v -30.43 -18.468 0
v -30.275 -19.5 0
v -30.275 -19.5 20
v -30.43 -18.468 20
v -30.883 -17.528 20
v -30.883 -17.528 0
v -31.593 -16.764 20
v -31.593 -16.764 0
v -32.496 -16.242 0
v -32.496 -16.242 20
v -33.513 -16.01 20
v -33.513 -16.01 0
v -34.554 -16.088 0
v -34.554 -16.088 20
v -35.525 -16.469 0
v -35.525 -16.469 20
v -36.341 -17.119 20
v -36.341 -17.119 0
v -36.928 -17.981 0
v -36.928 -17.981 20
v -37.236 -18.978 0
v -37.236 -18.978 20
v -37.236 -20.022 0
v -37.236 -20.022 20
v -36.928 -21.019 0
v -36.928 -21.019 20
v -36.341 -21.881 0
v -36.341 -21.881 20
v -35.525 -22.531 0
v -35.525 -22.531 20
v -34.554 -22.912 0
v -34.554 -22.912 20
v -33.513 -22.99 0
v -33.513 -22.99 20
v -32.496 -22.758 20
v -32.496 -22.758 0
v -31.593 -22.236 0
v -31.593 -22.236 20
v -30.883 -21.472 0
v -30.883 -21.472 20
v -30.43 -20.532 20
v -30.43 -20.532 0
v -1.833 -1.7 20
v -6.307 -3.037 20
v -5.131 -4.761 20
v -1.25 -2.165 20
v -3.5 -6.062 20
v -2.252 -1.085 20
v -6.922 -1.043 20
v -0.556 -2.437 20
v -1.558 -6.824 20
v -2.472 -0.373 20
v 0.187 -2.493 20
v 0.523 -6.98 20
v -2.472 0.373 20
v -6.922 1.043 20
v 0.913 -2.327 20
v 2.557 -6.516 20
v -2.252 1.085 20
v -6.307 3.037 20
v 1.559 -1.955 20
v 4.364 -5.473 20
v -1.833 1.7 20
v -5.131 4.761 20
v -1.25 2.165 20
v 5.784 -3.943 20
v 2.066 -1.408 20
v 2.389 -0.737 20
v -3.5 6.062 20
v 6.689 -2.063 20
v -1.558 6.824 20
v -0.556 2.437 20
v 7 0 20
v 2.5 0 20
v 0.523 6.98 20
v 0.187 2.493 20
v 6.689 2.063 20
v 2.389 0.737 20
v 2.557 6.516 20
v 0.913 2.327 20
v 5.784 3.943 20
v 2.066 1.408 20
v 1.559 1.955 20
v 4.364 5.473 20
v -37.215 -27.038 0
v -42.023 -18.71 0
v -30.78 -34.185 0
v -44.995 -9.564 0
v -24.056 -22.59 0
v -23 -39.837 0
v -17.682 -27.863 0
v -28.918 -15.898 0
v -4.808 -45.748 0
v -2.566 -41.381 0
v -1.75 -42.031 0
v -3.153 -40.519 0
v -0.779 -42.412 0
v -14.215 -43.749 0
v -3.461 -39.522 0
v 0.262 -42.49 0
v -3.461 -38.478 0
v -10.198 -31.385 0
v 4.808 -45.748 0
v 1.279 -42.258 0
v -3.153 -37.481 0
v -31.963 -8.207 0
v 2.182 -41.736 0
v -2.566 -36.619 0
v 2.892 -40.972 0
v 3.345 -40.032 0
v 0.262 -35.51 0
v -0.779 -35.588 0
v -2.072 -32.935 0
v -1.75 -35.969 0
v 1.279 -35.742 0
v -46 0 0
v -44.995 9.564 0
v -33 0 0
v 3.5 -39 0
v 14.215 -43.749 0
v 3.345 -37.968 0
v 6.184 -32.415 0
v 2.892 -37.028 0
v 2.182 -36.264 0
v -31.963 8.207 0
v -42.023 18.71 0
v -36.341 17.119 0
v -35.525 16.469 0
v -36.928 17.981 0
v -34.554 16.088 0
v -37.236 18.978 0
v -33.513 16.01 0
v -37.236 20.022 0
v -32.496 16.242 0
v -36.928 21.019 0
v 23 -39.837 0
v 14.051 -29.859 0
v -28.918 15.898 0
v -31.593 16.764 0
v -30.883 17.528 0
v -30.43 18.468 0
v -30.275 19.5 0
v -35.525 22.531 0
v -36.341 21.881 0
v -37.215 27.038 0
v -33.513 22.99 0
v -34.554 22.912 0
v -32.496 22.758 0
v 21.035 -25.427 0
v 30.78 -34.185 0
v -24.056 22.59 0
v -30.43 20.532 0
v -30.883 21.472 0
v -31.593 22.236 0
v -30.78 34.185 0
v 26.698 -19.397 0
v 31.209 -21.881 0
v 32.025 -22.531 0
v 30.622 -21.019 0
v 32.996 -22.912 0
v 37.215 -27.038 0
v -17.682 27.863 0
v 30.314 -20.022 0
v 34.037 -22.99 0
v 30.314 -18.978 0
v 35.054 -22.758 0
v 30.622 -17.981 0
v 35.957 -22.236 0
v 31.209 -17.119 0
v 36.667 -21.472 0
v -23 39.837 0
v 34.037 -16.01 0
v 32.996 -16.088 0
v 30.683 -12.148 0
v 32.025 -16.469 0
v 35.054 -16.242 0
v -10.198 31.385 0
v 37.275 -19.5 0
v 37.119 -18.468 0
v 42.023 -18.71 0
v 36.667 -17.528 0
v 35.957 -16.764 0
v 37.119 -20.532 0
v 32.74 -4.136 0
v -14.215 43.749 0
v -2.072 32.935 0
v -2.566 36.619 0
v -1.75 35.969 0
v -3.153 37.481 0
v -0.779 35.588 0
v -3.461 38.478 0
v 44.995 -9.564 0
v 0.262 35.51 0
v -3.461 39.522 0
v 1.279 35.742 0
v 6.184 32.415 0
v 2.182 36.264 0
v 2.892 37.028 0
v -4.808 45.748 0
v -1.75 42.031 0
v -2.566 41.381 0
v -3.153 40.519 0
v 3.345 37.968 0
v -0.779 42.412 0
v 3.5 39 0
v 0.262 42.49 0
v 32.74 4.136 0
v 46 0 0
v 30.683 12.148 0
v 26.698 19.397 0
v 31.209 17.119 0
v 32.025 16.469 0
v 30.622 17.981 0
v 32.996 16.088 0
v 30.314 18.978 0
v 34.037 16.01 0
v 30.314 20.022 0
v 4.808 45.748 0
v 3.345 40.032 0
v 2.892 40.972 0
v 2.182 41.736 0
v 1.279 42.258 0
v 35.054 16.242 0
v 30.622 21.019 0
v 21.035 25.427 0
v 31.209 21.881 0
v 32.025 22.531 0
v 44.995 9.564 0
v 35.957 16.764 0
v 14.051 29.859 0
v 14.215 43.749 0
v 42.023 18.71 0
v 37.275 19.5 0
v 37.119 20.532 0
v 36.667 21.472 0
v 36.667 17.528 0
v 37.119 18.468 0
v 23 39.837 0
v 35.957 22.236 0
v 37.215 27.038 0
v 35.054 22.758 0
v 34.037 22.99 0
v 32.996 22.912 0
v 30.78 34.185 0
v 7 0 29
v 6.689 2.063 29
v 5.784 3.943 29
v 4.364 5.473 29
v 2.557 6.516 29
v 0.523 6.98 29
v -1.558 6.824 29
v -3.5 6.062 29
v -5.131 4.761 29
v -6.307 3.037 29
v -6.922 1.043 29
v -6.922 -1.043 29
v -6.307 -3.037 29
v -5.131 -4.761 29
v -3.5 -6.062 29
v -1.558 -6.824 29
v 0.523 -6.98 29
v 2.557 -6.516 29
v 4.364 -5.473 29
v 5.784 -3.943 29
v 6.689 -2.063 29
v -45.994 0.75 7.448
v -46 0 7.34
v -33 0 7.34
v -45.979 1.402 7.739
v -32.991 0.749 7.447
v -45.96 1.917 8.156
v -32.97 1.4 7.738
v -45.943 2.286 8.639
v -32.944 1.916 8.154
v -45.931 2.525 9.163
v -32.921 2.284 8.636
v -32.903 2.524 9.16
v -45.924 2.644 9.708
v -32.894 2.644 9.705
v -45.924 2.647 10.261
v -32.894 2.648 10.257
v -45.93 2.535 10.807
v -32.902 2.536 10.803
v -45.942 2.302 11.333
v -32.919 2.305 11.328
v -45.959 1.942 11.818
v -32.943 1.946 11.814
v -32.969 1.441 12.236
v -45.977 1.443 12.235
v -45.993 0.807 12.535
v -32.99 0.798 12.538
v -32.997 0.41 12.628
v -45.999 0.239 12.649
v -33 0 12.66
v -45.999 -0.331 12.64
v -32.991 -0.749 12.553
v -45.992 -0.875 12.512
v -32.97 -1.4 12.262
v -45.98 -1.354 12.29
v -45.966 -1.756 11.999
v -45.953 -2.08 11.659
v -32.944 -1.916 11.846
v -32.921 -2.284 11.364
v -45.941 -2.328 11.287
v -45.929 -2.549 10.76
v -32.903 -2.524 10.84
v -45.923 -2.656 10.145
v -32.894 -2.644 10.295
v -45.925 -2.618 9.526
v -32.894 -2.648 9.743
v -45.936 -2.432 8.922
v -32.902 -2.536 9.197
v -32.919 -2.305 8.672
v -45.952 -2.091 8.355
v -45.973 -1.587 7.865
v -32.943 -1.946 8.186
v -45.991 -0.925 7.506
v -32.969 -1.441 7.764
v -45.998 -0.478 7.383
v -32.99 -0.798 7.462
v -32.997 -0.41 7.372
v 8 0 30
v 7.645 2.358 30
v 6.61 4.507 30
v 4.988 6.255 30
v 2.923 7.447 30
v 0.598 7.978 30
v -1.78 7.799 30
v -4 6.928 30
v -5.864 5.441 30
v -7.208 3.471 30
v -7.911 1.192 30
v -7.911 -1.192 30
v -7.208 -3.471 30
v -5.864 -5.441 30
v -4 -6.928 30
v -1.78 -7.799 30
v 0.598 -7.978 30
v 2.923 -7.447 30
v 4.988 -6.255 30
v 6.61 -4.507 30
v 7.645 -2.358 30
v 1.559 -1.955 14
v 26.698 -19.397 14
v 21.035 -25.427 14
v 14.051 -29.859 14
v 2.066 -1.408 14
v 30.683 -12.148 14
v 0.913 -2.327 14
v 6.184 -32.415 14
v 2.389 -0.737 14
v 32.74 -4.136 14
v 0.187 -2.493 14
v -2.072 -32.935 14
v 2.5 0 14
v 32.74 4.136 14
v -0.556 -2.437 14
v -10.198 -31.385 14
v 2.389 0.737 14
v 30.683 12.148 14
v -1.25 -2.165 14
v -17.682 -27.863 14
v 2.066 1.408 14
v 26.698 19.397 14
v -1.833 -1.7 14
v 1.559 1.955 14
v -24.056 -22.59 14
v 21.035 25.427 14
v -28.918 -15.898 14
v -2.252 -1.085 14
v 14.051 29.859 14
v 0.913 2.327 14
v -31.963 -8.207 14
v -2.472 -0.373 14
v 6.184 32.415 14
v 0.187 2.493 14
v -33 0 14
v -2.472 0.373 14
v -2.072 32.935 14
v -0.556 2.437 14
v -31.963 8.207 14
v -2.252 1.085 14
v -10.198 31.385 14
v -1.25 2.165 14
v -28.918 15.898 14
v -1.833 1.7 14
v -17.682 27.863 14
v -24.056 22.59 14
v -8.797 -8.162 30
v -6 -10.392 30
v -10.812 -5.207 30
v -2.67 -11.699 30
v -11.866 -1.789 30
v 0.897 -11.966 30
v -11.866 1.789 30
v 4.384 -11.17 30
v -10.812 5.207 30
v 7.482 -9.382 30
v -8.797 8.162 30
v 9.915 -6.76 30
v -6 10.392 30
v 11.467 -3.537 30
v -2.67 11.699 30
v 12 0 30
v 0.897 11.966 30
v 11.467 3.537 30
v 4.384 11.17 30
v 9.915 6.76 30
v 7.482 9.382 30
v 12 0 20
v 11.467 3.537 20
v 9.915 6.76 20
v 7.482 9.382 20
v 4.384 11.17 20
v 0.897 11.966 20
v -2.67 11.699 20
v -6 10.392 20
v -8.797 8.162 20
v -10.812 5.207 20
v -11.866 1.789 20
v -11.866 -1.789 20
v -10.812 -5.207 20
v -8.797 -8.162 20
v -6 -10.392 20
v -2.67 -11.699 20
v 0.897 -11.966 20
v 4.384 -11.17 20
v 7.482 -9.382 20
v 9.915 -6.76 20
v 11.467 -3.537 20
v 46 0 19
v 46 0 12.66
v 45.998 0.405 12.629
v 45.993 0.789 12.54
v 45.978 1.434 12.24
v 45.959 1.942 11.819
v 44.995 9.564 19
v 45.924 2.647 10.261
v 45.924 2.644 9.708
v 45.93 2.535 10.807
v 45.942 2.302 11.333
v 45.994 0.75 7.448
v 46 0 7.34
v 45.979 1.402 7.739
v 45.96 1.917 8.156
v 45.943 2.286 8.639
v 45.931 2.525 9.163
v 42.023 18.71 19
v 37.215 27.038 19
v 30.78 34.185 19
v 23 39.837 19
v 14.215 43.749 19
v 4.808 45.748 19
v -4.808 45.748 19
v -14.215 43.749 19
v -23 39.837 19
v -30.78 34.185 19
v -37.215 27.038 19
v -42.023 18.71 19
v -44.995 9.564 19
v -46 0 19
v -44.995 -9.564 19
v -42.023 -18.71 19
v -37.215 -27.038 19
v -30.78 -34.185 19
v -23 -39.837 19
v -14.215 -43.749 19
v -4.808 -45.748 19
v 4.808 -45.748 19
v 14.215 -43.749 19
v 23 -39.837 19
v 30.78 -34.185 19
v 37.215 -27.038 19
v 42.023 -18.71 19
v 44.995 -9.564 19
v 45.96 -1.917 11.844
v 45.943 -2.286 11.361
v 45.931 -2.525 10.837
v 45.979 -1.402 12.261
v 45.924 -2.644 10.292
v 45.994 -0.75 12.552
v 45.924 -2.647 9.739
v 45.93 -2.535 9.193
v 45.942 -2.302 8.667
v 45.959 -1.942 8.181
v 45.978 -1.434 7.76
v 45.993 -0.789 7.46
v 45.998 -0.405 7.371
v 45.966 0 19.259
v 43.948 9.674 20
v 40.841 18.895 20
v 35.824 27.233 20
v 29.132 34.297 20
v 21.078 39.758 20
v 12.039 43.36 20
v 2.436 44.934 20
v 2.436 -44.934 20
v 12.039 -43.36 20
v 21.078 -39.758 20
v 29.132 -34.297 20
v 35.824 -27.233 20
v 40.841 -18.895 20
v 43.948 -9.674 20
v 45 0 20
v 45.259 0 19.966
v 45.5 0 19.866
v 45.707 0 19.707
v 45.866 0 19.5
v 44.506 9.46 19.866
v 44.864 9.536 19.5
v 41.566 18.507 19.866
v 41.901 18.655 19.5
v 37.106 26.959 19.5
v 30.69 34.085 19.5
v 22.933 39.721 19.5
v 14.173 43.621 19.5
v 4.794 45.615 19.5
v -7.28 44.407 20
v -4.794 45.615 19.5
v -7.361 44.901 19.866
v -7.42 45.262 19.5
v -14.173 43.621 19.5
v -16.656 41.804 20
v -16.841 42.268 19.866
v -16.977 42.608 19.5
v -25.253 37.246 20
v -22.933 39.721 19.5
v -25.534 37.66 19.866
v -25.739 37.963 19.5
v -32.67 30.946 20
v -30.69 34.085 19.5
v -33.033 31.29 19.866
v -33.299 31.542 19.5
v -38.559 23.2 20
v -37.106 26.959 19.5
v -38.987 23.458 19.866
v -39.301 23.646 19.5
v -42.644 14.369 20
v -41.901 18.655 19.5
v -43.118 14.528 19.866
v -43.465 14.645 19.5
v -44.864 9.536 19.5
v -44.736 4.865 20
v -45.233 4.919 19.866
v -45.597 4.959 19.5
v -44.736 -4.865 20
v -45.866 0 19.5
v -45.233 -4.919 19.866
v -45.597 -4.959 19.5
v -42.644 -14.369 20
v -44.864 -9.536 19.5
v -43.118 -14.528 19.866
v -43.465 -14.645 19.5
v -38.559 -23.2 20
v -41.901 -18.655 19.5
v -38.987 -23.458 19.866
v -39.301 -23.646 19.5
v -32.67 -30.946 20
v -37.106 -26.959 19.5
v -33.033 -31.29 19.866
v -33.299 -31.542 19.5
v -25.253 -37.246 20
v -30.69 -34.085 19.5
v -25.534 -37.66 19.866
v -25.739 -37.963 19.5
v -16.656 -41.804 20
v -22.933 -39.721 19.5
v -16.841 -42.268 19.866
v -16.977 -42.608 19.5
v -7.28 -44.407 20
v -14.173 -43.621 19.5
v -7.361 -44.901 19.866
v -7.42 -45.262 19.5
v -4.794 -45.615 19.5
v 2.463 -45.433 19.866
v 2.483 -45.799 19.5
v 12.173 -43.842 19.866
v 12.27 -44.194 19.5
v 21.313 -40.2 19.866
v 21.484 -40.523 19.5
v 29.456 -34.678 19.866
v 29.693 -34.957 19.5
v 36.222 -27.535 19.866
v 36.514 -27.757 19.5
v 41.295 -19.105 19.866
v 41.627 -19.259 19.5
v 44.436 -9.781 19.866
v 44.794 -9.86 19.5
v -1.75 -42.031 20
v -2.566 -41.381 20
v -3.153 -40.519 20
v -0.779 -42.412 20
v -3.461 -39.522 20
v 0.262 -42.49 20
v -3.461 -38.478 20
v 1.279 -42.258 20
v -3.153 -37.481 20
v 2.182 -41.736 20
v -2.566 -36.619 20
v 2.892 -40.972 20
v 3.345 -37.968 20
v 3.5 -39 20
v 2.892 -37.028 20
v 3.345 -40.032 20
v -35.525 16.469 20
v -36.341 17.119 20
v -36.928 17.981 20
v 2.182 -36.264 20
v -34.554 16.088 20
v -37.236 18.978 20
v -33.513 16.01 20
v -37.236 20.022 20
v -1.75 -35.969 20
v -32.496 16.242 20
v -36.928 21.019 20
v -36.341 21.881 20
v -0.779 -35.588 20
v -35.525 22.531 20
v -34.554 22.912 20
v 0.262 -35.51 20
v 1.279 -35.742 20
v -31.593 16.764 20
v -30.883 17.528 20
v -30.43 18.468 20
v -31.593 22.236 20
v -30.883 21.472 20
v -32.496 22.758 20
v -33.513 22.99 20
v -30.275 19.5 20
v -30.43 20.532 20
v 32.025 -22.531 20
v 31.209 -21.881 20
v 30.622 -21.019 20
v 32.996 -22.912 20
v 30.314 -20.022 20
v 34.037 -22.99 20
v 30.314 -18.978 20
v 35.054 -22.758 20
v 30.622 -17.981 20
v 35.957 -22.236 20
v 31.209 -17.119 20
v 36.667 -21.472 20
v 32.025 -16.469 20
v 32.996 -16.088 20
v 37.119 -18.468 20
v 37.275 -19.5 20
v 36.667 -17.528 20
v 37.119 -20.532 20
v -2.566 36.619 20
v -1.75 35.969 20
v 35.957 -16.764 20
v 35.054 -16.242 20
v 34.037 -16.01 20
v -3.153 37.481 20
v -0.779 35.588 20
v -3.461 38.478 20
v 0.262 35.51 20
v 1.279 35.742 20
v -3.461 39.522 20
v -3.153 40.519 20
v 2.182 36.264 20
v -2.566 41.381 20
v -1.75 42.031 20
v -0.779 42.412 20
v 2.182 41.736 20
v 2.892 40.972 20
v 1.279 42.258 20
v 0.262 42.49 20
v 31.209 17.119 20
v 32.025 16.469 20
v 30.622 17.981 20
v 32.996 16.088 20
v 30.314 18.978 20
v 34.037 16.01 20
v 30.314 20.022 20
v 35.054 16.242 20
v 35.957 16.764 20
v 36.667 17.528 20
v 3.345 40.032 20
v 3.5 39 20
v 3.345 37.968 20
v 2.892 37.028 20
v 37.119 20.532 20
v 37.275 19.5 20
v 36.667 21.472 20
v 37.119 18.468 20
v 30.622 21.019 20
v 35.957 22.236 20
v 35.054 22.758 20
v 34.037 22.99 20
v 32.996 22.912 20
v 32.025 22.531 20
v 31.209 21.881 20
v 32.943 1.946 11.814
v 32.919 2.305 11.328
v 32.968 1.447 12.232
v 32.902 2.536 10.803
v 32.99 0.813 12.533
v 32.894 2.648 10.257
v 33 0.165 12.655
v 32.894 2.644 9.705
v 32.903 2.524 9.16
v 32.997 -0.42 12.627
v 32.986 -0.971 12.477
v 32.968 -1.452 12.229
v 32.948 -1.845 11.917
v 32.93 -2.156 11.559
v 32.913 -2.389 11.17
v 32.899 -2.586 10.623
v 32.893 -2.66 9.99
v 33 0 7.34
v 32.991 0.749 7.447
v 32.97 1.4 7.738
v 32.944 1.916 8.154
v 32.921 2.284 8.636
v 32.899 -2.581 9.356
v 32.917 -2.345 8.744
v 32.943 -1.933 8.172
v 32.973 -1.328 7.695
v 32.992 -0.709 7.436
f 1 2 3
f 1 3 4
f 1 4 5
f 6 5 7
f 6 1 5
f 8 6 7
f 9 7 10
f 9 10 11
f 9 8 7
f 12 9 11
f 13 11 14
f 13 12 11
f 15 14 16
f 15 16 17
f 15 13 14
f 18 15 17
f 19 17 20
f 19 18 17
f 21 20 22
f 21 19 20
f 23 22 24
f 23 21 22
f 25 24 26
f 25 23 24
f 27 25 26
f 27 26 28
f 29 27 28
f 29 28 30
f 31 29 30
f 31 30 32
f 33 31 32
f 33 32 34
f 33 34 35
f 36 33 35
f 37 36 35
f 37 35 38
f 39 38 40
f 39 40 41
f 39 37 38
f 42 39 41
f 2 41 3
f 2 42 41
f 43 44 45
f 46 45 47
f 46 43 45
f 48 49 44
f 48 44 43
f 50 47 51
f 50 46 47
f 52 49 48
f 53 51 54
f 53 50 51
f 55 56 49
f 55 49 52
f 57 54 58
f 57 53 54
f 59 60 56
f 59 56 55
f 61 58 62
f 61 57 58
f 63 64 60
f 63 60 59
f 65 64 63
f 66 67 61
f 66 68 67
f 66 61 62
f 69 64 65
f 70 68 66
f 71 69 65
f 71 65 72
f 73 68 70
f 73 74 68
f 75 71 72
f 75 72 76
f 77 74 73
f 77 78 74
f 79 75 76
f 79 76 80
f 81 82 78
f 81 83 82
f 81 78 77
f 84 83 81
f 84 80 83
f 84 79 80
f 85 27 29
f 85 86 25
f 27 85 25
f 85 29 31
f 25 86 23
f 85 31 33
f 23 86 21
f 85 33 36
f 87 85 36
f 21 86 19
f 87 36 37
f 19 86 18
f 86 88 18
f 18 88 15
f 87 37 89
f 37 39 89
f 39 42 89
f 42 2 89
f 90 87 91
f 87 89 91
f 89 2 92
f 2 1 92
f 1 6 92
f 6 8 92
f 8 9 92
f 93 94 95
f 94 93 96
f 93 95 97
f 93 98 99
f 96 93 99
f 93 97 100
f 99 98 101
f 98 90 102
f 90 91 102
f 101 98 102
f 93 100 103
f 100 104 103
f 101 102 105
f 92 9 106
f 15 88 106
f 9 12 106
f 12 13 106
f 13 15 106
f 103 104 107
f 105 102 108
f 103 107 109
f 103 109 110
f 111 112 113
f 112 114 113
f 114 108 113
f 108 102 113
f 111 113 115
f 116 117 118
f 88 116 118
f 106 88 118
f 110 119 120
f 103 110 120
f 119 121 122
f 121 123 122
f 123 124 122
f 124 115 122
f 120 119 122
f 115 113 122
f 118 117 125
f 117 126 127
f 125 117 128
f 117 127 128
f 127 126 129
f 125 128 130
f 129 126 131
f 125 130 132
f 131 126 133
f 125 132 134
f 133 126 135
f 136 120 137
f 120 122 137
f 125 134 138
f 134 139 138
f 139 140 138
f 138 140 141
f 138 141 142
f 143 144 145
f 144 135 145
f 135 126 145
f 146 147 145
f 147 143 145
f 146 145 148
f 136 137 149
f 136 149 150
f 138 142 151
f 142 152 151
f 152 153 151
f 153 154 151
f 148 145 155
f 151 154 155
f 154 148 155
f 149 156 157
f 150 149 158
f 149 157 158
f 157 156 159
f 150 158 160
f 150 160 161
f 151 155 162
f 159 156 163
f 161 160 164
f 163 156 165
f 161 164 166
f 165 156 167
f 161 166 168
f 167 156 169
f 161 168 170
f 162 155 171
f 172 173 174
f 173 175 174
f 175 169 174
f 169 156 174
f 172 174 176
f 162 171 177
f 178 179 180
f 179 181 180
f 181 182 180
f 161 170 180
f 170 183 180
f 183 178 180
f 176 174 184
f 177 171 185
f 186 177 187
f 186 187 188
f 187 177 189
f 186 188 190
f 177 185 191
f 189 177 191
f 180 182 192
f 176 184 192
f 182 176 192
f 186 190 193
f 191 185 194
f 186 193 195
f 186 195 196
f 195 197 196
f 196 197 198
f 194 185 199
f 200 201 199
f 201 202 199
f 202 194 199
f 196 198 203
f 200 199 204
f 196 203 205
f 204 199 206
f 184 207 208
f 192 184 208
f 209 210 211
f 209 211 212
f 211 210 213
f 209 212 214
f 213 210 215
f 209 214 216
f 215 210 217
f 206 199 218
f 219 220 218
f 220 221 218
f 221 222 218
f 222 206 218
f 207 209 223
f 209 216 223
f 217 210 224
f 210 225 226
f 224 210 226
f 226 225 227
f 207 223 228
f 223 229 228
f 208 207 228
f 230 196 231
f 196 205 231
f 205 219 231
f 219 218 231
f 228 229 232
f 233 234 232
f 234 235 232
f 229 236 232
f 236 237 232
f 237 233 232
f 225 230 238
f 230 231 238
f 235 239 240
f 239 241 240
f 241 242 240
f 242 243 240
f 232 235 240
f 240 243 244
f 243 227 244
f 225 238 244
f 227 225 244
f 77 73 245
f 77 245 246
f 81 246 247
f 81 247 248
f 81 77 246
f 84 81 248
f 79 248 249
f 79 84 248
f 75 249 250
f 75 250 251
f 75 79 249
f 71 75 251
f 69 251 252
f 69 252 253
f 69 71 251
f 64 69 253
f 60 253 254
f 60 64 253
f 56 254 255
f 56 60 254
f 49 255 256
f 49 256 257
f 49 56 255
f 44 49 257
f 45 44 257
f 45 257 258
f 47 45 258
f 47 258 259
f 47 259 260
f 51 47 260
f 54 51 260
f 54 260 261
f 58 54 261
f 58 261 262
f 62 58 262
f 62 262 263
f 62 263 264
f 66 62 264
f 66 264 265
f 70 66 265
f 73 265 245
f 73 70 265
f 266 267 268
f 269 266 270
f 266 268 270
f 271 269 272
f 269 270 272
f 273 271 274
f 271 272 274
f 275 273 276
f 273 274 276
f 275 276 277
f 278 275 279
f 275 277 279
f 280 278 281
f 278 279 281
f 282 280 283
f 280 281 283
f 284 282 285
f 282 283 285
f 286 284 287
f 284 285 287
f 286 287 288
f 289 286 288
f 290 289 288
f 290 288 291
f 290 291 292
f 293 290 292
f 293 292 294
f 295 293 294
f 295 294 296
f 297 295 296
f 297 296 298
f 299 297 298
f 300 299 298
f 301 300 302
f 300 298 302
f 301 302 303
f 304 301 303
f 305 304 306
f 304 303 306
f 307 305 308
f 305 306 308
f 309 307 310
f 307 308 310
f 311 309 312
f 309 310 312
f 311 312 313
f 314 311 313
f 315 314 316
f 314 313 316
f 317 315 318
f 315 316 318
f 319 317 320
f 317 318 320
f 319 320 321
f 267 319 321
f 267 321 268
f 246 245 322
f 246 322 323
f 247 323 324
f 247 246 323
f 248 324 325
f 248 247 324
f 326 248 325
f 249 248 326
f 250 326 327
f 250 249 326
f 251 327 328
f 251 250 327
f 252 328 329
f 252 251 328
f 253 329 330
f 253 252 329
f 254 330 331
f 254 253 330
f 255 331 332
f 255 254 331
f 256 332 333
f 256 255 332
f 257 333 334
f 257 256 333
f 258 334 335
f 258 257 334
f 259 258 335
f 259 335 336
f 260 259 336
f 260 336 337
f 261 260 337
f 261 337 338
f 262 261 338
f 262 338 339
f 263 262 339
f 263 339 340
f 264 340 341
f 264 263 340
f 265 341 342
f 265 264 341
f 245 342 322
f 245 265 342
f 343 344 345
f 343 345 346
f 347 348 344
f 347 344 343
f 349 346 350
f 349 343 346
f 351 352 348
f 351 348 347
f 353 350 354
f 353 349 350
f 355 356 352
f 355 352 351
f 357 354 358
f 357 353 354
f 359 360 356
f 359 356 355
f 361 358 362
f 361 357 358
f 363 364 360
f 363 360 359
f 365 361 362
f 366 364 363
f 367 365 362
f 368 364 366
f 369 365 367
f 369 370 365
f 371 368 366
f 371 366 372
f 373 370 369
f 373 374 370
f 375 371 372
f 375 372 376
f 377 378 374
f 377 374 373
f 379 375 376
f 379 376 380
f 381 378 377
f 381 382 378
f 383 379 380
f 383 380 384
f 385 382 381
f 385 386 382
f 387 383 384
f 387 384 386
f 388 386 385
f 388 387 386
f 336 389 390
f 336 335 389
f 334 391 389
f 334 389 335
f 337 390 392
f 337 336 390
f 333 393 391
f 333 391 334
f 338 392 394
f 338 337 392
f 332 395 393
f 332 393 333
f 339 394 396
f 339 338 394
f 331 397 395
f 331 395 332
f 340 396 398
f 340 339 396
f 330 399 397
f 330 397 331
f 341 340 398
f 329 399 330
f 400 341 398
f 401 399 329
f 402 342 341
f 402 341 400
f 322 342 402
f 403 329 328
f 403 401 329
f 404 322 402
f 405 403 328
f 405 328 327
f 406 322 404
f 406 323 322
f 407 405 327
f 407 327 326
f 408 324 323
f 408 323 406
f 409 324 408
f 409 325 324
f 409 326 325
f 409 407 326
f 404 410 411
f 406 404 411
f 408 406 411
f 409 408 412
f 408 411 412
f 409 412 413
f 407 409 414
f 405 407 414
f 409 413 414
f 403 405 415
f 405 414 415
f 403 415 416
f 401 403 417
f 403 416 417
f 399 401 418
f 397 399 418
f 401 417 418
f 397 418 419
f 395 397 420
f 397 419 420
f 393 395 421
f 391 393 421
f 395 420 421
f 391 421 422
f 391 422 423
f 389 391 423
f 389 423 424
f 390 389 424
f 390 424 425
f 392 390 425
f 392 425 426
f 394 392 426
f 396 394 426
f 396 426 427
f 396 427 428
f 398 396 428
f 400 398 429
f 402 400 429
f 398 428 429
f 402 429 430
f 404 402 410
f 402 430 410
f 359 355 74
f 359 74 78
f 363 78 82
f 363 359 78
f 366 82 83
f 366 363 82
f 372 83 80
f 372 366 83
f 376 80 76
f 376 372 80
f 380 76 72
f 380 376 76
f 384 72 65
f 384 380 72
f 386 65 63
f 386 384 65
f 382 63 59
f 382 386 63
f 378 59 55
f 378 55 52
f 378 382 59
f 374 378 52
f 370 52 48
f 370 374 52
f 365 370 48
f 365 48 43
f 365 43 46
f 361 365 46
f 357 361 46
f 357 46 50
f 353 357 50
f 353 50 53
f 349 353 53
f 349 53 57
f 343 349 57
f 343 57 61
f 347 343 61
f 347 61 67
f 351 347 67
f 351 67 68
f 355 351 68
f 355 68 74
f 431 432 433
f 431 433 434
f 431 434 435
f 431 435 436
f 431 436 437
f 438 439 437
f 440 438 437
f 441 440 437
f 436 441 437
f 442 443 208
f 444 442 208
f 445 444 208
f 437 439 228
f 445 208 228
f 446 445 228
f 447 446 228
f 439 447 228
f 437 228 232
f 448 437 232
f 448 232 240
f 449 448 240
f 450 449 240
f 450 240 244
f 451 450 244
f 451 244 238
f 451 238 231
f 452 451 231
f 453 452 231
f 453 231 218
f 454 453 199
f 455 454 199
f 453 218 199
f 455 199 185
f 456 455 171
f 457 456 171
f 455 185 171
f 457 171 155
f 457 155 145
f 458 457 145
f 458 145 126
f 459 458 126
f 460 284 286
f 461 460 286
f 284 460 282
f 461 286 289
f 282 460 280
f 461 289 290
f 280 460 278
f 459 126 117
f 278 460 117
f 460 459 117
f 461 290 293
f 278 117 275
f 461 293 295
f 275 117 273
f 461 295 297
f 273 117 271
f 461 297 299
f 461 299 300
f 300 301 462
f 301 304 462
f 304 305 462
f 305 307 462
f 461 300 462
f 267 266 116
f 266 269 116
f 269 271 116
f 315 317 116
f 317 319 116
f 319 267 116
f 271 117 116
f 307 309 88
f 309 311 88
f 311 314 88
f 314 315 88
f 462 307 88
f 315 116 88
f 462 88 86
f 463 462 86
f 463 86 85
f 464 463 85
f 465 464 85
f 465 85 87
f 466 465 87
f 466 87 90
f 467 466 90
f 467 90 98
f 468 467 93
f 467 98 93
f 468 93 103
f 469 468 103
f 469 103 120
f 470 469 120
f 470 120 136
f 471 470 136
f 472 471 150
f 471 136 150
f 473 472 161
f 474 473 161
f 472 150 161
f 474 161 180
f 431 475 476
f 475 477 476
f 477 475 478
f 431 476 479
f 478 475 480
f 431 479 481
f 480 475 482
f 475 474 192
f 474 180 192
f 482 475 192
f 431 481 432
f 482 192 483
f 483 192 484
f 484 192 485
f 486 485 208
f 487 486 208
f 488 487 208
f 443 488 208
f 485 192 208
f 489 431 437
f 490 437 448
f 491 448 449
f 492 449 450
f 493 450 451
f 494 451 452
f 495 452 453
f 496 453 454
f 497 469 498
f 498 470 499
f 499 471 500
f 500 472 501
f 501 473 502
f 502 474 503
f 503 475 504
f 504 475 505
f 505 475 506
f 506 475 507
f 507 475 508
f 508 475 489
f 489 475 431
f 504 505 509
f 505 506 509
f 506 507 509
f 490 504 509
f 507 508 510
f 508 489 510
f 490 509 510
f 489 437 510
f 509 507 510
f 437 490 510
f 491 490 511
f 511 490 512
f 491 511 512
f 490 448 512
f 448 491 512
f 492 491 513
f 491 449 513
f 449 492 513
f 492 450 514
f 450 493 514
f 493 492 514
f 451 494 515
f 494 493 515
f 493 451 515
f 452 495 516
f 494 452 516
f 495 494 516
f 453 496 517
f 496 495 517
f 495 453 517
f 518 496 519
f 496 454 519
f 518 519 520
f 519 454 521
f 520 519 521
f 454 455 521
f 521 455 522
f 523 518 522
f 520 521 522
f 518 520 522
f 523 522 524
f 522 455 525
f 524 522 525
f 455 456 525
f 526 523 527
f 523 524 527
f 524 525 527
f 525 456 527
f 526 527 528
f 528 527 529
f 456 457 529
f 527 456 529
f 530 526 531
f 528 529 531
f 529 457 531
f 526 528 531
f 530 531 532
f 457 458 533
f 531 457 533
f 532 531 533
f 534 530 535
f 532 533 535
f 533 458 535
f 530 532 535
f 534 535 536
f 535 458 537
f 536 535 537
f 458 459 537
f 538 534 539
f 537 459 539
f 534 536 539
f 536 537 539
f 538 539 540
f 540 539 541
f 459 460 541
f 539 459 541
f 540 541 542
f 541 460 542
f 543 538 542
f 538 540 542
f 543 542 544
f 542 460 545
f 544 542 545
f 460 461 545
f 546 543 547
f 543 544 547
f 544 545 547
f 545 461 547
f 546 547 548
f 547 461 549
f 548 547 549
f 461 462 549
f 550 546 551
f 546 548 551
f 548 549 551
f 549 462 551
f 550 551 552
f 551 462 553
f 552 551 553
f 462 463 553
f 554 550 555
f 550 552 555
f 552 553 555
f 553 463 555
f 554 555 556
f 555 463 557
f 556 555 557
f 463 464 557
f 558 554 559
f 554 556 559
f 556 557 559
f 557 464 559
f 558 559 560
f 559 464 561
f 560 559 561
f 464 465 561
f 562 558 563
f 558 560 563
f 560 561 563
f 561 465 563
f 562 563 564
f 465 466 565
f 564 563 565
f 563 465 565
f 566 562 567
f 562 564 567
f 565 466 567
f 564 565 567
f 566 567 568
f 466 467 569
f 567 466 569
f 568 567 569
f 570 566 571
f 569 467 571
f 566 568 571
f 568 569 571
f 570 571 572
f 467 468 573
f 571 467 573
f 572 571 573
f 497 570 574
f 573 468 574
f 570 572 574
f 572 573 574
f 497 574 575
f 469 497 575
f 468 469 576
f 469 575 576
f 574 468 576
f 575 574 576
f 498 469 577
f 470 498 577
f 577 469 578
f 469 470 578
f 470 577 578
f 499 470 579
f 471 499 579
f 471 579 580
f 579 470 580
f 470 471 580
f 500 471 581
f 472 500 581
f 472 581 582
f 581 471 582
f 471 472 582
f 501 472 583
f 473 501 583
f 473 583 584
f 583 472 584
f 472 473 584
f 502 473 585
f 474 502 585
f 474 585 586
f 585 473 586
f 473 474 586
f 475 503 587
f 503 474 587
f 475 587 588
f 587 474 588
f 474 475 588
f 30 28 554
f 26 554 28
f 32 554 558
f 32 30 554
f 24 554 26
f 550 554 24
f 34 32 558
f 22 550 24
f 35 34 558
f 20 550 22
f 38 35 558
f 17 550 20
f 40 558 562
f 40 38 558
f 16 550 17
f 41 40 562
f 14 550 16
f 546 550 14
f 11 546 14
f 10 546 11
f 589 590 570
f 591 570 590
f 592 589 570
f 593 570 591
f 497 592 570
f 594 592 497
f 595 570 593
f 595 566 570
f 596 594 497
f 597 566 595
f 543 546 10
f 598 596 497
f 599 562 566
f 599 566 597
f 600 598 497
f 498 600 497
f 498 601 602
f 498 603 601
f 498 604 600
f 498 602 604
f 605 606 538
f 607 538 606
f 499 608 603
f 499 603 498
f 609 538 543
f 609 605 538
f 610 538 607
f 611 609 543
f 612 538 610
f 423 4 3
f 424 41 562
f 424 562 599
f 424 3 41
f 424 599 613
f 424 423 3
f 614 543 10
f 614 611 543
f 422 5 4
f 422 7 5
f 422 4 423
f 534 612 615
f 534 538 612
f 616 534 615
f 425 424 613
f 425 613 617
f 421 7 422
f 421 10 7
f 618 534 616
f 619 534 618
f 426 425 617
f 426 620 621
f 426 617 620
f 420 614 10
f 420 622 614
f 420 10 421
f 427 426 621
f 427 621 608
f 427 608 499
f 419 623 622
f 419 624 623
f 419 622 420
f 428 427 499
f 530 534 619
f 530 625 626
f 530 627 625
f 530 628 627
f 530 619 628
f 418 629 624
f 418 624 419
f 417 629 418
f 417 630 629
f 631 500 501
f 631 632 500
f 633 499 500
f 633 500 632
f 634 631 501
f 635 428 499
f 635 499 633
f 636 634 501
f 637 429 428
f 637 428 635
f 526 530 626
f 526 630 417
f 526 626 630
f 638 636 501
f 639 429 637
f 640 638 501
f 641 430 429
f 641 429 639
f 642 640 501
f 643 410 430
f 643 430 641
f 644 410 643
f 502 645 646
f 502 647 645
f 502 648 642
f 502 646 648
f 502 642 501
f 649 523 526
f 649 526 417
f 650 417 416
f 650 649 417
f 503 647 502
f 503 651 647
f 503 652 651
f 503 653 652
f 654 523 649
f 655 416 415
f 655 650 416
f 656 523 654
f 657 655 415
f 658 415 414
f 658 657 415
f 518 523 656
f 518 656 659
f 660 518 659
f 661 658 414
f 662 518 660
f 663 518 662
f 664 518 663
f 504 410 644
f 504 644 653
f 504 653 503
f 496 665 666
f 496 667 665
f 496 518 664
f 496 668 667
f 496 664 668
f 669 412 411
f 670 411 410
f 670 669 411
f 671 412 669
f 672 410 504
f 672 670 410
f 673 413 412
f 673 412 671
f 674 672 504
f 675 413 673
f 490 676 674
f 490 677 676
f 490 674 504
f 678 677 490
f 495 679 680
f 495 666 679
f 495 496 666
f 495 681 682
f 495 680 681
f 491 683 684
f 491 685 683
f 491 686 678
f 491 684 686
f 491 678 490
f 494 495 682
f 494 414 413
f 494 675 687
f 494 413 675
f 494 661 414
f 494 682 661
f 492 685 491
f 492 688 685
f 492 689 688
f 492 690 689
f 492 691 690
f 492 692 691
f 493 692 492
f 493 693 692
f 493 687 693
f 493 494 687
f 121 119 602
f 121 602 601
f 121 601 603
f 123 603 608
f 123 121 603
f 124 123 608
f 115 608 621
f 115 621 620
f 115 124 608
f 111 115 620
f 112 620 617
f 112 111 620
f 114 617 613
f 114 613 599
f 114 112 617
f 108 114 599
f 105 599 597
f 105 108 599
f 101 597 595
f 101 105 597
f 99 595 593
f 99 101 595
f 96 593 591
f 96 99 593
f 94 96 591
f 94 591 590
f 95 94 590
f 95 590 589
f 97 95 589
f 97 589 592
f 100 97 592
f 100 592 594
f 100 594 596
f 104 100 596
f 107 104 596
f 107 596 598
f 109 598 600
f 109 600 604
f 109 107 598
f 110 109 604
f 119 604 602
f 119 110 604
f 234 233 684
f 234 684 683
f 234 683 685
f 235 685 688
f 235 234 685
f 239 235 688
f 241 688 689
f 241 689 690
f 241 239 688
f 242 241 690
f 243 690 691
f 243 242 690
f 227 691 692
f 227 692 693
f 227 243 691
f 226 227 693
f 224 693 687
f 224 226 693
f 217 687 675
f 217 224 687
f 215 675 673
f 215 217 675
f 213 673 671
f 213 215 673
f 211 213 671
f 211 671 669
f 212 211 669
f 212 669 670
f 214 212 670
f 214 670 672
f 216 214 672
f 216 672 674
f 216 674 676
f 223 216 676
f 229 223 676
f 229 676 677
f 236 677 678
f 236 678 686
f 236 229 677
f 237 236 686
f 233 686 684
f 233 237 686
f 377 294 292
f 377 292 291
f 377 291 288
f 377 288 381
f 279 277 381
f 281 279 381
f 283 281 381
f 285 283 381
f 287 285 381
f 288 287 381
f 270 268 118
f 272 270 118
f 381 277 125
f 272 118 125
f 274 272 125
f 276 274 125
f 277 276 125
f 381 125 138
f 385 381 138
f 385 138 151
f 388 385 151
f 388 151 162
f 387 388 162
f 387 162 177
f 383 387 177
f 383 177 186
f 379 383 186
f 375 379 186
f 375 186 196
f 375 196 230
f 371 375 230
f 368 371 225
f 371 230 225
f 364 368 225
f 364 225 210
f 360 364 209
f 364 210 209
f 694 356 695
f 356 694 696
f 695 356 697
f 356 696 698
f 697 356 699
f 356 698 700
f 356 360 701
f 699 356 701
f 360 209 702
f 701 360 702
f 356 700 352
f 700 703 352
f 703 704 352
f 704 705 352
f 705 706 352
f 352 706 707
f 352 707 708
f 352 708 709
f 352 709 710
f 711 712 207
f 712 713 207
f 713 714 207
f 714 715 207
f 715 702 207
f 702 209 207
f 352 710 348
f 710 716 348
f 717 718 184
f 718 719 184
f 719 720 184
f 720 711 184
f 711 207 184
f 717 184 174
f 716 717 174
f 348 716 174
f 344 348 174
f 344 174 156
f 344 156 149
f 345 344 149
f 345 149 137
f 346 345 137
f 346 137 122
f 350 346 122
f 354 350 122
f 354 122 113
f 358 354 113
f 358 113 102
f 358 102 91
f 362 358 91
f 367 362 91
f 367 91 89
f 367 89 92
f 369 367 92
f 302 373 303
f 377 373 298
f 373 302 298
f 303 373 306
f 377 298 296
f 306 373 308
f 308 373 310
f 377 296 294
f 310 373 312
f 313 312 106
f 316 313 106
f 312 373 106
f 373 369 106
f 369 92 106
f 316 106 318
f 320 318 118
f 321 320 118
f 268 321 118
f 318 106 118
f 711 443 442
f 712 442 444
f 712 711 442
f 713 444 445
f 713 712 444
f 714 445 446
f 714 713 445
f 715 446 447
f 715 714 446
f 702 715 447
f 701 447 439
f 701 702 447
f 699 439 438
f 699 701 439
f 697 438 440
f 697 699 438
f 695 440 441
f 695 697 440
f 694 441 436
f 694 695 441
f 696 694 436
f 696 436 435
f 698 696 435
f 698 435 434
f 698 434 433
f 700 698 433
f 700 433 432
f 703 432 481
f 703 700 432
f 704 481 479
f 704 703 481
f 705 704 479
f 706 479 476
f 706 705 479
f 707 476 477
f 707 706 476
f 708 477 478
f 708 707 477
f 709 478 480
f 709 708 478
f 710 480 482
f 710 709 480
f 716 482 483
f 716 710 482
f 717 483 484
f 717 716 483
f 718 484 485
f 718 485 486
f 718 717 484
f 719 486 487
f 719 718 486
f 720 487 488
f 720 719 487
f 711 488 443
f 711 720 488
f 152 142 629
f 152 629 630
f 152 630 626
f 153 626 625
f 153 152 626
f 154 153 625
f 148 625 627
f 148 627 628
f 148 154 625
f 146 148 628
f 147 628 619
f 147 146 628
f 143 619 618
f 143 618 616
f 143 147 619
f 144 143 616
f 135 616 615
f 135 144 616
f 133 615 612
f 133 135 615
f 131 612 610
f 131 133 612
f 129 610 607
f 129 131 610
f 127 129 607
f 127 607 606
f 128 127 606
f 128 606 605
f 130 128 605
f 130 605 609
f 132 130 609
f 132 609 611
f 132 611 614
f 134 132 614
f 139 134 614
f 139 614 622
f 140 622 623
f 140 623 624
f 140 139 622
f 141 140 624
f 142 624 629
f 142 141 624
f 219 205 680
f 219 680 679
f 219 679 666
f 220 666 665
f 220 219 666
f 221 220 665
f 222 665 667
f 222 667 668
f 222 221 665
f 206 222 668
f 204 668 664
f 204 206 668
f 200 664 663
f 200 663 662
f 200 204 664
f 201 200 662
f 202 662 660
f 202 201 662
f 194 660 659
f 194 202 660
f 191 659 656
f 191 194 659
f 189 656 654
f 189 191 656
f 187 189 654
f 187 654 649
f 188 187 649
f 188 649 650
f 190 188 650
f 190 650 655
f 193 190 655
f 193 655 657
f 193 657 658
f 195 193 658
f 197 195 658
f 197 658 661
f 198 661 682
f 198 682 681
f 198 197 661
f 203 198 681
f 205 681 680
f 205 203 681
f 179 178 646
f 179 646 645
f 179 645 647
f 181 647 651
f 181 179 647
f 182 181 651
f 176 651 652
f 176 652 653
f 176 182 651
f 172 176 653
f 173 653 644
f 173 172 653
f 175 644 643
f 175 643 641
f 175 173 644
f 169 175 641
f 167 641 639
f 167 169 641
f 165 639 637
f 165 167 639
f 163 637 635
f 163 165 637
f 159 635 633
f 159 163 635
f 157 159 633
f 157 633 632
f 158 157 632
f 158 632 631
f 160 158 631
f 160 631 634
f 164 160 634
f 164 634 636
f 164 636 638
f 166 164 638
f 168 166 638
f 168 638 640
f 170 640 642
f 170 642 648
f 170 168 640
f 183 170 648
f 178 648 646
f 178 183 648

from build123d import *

# Parameters (mm, degrees)
SKETCH2_R               = 46
SKETCH2_R_2             = 3.5
SKETCH2_R_3             = 2.5
BOSS_EXTRUDE1_DEPTH     = 20
SKETCH3_R               = 12
SKETCH3_R_2             = 7
BOSS_EXTRUDE2_DEPTH     = 10
CHAMFER1_SIZE           = 1
SKETCH6_R               = 33
CUT_EXTRUDE1_DEPTH      = 14
FILLET1_R               = 1
SKETCH7_R               = 2.66023902
CUT_EXTRUDE2_DEPTH      = 47
CUT_EXTRUDE2_DEPTH_BACK = 47


with BuildPart() as part:
    # Sketch2 → Boss-Extrude1 (new body)
    with BuildSketch(Plane.XY):
        Circle(SKETCH2_R)
        with Locations((0, 39)):
            Circle(SKETCH2_R_2, mode=Mode.SUBTRACT)
        Circle(SKETCH2_R_3, mode=Mode.SUBTRACT)
        with Locations((33.774990748, 19.5)):
            Circle(SKETCH2_R_2, mode=Mode.SUBTRACT)
        with Locations((33.774990748, -19.5)):
            Circle(SKETCH2_R_2, mode=Mode.SUBTRACT)
        with Locations((0, -39)):
            Circle(SKETCH2_R_2, mode=Mode.SUBTRACT)
        with Locations((-33.774990748, -19.5)):
            Circle(SKETCH2_R_2, mode=Mode.SUBTRACT)
        with Locations((-33.774990748, 19.5)):
            Circle(SKETCH2_R_2, mode=Mode.SUBTRACT)
    extrude(amount=BOSS_EXTRUDE1_DEPTH)

    # Sketch3 → Boss-Extrude2 (add)
    with BuildSketch(Plane.XY.offset(20)):
        Circle(SKETCH3_R)
        Circle(SKETCH3_R_2, mode=Mode.SUBTRACT)
    extrude(amount=BOSS_EXTRUDE2_DEPTH)

    # Chamfer1
    chamfer1_edges = [part.edges().sort_by_distance(p)[0] for p in [
        (-7, 0, 30),
    ]]
    chamfer(chamfer1_edges, length=CHAMFER1_SIZE)

    # Sketch6 → Cut-Extrude1 (cut)
    with BuildSketch(Plane(origin=(0, 0, 0), x_dir=(-1, 0, 0), z_dir=(0, 0, -1))):
        Circle(SKETCH6_R)
    extrude(amount=-CUT_EXTRUDE1_DEPTH, mode=Mode.SUBTRACT)

    # Fillet1
    fillet1_edges = [part.edges().sort_by_distance(p)[0] for p in [
        (-46, 0, 20),
    ]]
    fillet(fillet1_edges, radius=FILLET1_R)

    # Sketch7 → Cut-Extrude2 (cut, two sides)
    with BuildSketch(Plane(origin=(0, 0, 0), x_dir=(0, 0, -1), z_dir=(1, 0, 0))) as cut_extrude2_sk:
        with Locations((-10, 0)):
            Circle(SKETCH7_R)
    extrude(amount=CUT_EXTRUDE2_DEPTH, mode=Mode.SUBTRACT)
    extrude(cut_extrude2_sk.sketch, amount=-CUT_EXTRUDE2_DEPTH_BACK, mode=Mode.SUBTRACT)


solid = part.part
